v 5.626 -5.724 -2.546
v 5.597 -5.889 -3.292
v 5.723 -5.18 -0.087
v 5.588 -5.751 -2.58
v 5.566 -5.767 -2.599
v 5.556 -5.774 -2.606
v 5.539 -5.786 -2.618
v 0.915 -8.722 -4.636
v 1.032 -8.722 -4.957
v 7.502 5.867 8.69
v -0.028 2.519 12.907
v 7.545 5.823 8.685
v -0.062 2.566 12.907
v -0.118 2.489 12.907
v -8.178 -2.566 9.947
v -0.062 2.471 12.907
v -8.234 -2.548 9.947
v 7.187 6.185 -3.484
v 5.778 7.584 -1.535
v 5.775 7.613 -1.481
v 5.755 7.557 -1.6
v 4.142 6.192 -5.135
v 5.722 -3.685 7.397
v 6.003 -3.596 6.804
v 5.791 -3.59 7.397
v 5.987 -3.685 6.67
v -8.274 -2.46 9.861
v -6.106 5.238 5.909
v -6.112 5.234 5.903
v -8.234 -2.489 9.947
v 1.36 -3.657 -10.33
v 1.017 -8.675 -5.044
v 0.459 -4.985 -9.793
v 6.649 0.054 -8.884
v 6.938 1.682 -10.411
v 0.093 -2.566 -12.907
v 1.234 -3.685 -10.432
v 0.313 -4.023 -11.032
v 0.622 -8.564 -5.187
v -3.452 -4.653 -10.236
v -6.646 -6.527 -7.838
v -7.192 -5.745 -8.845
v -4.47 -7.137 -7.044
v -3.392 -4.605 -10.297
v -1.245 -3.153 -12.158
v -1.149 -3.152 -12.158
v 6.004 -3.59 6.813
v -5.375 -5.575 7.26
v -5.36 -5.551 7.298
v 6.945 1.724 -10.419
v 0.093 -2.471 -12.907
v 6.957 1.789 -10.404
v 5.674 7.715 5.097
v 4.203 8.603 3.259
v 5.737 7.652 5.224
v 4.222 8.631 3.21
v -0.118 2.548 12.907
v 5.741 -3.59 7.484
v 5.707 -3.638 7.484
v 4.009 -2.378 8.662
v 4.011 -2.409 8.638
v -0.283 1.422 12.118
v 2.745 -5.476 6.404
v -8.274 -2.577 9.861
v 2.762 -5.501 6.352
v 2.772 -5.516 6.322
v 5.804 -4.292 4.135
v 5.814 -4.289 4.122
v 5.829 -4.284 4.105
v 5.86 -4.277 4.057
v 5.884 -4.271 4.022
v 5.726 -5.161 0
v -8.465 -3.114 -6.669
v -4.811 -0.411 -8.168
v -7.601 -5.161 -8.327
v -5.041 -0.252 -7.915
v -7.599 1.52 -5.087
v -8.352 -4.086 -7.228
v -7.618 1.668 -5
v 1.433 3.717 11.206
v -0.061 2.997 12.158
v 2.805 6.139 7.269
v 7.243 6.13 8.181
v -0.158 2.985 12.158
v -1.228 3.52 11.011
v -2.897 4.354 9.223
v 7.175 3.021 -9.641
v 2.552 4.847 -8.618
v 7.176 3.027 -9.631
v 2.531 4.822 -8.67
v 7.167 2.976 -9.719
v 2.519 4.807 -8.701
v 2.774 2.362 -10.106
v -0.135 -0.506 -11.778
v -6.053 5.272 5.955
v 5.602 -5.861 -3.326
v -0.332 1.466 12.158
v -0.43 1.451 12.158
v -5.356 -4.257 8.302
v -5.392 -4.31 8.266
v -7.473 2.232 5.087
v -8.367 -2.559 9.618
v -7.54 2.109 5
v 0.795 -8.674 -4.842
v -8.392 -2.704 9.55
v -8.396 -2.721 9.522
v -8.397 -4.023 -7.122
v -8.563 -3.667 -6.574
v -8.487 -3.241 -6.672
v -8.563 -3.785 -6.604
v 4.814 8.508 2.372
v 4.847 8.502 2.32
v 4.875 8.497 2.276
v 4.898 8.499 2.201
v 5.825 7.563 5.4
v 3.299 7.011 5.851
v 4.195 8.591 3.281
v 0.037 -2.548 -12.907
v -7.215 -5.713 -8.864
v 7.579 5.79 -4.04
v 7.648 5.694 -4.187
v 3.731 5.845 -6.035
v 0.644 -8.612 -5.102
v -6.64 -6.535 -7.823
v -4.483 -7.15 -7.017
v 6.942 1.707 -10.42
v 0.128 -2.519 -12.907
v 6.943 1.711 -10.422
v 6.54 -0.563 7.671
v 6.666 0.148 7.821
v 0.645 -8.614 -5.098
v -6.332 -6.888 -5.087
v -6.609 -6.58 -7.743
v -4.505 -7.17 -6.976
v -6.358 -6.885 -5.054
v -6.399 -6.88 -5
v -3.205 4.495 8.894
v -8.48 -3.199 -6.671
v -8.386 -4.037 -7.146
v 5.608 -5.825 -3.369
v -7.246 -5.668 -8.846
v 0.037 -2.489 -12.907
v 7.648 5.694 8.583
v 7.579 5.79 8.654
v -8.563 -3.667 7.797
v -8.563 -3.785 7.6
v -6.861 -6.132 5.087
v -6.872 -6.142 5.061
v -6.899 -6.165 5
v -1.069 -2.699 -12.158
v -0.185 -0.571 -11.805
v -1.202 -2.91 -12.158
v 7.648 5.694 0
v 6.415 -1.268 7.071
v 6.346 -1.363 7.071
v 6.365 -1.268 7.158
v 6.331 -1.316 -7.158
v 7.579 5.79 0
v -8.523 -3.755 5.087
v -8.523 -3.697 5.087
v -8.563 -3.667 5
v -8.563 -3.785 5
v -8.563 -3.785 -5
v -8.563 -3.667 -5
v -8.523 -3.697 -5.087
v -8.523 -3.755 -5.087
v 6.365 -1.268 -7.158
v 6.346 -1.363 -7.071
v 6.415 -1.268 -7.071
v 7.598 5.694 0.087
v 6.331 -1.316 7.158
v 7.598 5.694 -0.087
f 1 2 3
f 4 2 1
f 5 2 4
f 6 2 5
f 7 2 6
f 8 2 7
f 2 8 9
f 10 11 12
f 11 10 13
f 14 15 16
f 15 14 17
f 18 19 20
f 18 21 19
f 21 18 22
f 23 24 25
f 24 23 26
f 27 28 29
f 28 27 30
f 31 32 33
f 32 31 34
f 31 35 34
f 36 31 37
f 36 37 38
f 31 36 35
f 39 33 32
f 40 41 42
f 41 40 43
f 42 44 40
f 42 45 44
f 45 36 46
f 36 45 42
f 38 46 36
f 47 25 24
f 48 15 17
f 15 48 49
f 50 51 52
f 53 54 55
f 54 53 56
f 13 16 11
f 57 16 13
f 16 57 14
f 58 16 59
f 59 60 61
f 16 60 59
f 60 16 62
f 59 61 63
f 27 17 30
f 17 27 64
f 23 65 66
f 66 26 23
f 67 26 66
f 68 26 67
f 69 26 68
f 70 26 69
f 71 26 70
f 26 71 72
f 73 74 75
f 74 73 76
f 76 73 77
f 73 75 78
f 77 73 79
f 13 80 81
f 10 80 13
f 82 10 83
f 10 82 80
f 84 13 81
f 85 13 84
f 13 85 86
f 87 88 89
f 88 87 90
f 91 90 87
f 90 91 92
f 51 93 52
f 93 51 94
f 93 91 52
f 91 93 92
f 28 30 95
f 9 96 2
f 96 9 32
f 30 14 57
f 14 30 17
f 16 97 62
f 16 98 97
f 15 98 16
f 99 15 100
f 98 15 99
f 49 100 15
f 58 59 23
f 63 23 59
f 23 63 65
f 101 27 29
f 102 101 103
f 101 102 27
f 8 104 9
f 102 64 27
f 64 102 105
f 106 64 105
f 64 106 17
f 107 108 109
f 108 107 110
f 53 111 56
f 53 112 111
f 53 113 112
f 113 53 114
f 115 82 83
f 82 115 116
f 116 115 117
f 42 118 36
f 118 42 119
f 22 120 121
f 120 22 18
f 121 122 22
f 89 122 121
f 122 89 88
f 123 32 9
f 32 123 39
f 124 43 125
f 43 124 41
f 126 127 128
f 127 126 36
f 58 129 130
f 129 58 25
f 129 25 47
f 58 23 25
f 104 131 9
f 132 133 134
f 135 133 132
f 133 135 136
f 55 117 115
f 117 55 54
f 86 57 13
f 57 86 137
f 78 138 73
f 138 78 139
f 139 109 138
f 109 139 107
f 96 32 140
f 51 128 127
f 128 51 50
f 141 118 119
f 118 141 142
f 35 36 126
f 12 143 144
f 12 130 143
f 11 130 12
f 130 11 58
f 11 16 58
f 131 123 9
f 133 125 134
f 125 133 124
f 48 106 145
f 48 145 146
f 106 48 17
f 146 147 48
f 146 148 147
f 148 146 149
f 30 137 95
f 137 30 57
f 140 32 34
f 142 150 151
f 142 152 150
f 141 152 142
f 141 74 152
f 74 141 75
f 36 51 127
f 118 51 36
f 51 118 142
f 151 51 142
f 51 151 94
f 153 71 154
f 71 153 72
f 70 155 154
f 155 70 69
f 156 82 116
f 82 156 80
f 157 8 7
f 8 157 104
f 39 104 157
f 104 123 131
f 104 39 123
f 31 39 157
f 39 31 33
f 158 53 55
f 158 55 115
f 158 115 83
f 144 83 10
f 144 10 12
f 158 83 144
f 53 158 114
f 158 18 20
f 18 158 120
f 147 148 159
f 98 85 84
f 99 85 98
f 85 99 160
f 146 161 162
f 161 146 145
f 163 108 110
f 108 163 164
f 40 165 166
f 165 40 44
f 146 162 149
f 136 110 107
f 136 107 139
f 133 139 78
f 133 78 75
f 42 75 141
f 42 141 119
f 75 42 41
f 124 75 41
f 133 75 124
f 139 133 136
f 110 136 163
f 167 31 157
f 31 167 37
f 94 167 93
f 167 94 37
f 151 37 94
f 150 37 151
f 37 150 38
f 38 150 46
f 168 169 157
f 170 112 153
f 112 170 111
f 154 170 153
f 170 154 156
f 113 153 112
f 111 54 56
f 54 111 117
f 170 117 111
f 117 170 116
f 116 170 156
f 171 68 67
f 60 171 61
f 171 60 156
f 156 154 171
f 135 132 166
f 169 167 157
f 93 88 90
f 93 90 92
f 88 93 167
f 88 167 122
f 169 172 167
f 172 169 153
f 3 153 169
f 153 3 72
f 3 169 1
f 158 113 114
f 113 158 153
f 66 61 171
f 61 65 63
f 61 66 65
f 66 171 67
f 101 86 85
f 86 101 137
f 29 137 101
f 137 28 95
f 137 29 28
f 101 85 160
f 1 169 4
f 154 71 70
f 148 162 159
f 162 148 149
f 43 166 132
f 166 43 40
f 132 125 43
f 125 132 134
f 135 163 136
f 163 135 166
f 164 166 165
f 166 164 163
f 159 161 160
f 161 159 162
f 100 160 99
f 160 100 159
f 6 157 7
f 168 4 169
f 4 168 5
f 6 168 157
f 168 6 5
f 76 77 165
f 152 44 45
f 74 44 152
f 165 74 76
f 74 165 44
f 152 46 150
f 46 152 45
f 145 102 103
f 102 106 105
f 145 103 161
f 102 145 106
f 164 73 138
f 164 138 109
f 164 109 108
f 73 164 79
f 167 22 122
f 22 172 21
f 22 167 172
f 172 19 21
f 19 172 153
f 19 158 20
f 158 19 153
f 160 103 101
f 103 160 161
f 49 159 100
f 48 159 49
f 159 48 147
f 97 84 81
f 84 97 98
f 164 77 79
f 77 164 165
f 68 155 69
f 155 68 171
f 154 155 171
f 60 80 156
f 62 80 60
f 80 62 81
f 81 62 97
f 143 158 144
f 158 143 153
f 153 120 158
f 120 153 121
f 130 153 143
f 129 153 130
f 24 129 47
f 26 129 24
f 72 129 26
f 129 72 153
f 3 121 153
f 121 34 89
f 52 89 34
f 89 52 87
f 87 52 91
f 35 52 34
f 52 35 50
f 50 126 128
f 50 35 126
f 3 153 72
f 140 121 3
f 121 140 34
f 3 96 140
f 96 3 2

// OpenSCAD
// Auto-generated OpenSCAD file

    inner_points = 10*[[-0.1519325222677969, -0.49588870782043115, 1.2071067811865481], [-0.2752191363280171, -1.1921648102349602, 0.5000000000000018], [0.14570769345513235, 1.185070501785053, -0.5000000000000018], [0.02242107939491221, 0.4887943993705236, -1.2071067811865481], [0.02242107939513263, 0.4887943993704884, 1.2071067811865466], [-0.2752191363281084, -1.1921648102349456, -0.499999999999998], [0.14570769345522366, 1.1850705017850383, 0.499999999999998], [-0.15193252226801734, -0.49588870782039596, -1.2071067811865466], [-0.848208624682401, -0.37260209376026526, 0.5000000000000662], [-0.6738550230195627, 0.612081013430669, -0.4999999999999354], [-0.6738550230194714, 0.6120810134306545, 0.5000000000000646], [-0.8482086246824923, -0.3726020937602507, -0.49999999999993383], [0.6315203809781617, -0.12683376828511966, 0.7071067811864822], [0.5082337669179414, -0.8231098706996488, -6.428191312579656e-14], [0.7548069950382528, 0.56944233412943, -6.644684802381562e-14], [0.6315203809780325, -0.1268337682850991, -0.7071067811866129]];

    outer_points = 10*[[-0.007761474101058263, 0.2518537970485801, 1.282035961125326], [-0.8193543823962504, -0.2518537970485801, 0.9860704042545944], [0.8193543823962504, 0.2518537970485801, -0.9860704042545944], [0.007761474101058263, -0.2518537970485801, -1.282035961125326], [0.8083780004585261, 0.608028852569843, 0.8270022394188679], [-1.1509806058735501, -0.608028852569843, 0.11247817802624172], [1.1509806058735501, 0.608028852569843, -0.11247817802624172], [-0.8083780004585261, -0.608028852569843, -0.8270022394188679], [-0.5768761153857935, 0.6108513156443435, 0.54228647196198], [-0.09236286430350876, 0.6108513156443435, -0.786339475972831], [0.23926335917379102, 0.9670263711656064, 0.08725275025552175], [-0.9085023388630934, 0.25467626012308053, -0.3313057542663727], [0.5691146412847352, -0.3589975185957634, 0.7397494891633462], [-0.24247826701045683, -0.8627051126929235, 0.44378393229261437], [0.9117172466997592, -0.3589975185957634, -0.19973092828176342], [0.10012433840456708, -0.8627051126929235, -0.4956964851524952]];

    // Convex hull for inner set (I)
    module inner_hull() {
        hull() {
            for (p = inner_points) {
                translate(p) sphere(r=0.1);
            }
        }
    }

    // Convex hull for outer set (O) minus inner hull (O \ I)
    module outer_minus_inner() {
        difference() {
            hull() {
                for (p = outer_points) {
                    translate(p) sphere(r=0.1);
                }
            }
            inner_hull(); // Subtract inner hull
        }
    }

    // Convex hull for outer set (O) minus all translated inner hulls
    module outer_minus_AllTranslationInner() {
        difference() {
            hull() {
                for (p = outer_points) {
                    translate(p) sphere(r=0.1);
                }
            }
            hull() {
                translate([0,0,50]) inner_hull();
                translate([0,0,-50]) inner_hull();
            }; // Subtract translated inner hulls
        }
    }

    // Difference between outer_minus_inner and outer_minus_AllTranslationInner
    module outer_minus_inner_diff() {
        difference() {
            // Outer minus inner
            difference() {
                hull() {
                    for (p = outer_points) {
                        translate(p) sphere(r=0.1);
                    }
                }
                inner_hull();
            }

            // Subtract Outer minus AllTranslationInner
            difference() {
                hull() {
                    for (p = outer_points) {
                        translate(p) sphere(r=0.1);
                    }
                }
                hull() {
                    translate([0,0,50]) inner_hull();
                    translate([0,0,-50]) inner_hull();
                };
            }
        }
    }

    // Rendering all with colors applied
    color([1, 1, 0, 1]) outer_minus_inner_diff(); // Opaque yellow
    
